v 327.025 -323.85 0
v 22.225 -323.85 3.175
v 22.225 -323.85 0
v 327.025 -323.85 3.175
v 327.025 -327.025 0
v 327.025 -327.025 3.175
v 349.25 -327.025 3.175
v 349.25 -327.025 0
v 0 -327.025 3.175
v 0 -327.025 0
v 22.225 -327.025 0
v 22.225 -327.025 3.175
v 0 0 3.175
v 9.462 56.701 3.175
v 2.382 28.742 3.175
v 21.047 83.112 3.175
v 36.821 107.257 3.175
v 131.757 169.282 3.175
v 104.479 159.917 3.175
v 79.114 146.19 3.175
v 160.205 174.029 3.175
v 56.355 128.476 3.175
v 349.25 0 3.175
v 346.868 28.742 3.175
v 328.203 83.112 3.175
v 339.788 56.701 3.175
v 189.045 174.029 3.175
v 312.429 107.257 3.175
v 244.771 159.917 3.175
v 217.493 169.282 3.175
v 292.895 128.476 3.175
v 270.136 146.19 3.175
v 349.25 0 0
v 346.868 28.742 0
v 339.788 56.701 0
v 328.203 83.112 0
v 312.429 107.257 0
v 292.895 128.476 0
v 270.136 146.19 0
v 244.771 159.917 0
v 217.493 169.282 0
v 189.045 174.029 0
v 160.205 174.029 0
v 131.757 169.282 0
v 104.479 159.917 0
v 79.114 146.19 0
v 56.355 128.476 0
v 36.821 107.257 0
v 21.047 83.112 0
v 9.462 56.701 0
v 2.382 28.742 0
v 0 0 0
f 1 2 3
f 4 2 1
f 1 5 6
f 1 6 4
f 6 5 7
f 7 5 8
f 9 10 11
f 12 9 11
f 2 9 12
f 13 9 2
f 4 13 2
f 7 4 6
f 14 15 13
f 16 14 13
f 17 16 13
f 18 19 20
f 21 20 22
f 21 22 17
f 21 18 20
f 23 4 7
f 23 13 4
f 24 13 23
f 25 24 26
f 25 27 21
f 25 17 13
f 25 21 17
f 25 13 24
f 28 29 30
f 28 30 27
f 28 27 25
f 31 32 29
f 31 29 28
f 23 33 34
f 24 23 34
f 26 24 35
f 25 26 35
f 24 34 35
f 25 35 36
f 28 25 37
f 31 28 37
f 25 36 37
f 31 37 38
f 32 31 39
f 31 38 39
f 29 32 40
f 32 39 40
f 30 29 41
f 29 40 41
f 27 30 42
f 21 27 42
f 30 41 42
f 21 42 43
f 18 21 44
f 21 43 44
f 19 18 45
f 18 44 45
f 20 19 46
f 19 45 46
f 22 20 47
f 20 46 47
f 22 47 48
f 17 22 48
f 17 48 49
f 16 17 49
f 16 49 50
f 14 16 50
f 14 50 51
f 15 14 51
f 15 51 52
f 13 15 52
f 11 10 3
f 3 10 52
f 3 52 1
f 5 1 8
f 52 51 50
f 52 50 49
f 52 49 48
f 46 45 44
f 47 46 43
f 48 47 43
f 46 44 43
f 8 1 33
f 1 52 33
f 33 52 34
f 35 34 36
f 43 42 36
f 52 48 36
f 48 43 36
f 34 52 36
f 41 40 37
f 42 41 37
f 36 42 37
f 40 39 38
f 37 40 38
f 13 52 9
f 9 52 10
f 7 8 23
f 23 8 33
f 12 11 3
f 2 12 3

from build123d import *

# Parameters (mm, degrees)
BOSS_EXTRUDE1_DEPTH = 3.175
SKETCH2_W           = 304.8
SKETCH2_H           = 3.175
CUT_EXTRUDE1_DEPTH  = 3.175


with BuildPart() as part:
    # Sketch1 → Boss-Extrude1 (new body)
    with BuildSketch(Plane.XY):
        with BuildLine():
            Line((0, 0), (0, -327.025))
            Line((0, -327.025), (349.25, -327.025))
            Line((349.25, -327.025), (349.25, 0))
            ThreePointArc((349.25, 0), (174.625, 174.625), (0, 0))
        make_face()
    extrude(amount=BOSS_EXTRUDE1_DEPTH)

    # Sketch2 → Cut-Extrude1 (cut)
    with BuildSketch(Plane.XY.offset(3.175)):
        with Locations((174.625, -325.4375)):
            Rectangle(SKETCH2_W, SKETCH2_H)
    extrude(amount=-CUT_EXTRUDE1_DEPTH, mode=Mode.SUBTRACT)


solid = part.part
